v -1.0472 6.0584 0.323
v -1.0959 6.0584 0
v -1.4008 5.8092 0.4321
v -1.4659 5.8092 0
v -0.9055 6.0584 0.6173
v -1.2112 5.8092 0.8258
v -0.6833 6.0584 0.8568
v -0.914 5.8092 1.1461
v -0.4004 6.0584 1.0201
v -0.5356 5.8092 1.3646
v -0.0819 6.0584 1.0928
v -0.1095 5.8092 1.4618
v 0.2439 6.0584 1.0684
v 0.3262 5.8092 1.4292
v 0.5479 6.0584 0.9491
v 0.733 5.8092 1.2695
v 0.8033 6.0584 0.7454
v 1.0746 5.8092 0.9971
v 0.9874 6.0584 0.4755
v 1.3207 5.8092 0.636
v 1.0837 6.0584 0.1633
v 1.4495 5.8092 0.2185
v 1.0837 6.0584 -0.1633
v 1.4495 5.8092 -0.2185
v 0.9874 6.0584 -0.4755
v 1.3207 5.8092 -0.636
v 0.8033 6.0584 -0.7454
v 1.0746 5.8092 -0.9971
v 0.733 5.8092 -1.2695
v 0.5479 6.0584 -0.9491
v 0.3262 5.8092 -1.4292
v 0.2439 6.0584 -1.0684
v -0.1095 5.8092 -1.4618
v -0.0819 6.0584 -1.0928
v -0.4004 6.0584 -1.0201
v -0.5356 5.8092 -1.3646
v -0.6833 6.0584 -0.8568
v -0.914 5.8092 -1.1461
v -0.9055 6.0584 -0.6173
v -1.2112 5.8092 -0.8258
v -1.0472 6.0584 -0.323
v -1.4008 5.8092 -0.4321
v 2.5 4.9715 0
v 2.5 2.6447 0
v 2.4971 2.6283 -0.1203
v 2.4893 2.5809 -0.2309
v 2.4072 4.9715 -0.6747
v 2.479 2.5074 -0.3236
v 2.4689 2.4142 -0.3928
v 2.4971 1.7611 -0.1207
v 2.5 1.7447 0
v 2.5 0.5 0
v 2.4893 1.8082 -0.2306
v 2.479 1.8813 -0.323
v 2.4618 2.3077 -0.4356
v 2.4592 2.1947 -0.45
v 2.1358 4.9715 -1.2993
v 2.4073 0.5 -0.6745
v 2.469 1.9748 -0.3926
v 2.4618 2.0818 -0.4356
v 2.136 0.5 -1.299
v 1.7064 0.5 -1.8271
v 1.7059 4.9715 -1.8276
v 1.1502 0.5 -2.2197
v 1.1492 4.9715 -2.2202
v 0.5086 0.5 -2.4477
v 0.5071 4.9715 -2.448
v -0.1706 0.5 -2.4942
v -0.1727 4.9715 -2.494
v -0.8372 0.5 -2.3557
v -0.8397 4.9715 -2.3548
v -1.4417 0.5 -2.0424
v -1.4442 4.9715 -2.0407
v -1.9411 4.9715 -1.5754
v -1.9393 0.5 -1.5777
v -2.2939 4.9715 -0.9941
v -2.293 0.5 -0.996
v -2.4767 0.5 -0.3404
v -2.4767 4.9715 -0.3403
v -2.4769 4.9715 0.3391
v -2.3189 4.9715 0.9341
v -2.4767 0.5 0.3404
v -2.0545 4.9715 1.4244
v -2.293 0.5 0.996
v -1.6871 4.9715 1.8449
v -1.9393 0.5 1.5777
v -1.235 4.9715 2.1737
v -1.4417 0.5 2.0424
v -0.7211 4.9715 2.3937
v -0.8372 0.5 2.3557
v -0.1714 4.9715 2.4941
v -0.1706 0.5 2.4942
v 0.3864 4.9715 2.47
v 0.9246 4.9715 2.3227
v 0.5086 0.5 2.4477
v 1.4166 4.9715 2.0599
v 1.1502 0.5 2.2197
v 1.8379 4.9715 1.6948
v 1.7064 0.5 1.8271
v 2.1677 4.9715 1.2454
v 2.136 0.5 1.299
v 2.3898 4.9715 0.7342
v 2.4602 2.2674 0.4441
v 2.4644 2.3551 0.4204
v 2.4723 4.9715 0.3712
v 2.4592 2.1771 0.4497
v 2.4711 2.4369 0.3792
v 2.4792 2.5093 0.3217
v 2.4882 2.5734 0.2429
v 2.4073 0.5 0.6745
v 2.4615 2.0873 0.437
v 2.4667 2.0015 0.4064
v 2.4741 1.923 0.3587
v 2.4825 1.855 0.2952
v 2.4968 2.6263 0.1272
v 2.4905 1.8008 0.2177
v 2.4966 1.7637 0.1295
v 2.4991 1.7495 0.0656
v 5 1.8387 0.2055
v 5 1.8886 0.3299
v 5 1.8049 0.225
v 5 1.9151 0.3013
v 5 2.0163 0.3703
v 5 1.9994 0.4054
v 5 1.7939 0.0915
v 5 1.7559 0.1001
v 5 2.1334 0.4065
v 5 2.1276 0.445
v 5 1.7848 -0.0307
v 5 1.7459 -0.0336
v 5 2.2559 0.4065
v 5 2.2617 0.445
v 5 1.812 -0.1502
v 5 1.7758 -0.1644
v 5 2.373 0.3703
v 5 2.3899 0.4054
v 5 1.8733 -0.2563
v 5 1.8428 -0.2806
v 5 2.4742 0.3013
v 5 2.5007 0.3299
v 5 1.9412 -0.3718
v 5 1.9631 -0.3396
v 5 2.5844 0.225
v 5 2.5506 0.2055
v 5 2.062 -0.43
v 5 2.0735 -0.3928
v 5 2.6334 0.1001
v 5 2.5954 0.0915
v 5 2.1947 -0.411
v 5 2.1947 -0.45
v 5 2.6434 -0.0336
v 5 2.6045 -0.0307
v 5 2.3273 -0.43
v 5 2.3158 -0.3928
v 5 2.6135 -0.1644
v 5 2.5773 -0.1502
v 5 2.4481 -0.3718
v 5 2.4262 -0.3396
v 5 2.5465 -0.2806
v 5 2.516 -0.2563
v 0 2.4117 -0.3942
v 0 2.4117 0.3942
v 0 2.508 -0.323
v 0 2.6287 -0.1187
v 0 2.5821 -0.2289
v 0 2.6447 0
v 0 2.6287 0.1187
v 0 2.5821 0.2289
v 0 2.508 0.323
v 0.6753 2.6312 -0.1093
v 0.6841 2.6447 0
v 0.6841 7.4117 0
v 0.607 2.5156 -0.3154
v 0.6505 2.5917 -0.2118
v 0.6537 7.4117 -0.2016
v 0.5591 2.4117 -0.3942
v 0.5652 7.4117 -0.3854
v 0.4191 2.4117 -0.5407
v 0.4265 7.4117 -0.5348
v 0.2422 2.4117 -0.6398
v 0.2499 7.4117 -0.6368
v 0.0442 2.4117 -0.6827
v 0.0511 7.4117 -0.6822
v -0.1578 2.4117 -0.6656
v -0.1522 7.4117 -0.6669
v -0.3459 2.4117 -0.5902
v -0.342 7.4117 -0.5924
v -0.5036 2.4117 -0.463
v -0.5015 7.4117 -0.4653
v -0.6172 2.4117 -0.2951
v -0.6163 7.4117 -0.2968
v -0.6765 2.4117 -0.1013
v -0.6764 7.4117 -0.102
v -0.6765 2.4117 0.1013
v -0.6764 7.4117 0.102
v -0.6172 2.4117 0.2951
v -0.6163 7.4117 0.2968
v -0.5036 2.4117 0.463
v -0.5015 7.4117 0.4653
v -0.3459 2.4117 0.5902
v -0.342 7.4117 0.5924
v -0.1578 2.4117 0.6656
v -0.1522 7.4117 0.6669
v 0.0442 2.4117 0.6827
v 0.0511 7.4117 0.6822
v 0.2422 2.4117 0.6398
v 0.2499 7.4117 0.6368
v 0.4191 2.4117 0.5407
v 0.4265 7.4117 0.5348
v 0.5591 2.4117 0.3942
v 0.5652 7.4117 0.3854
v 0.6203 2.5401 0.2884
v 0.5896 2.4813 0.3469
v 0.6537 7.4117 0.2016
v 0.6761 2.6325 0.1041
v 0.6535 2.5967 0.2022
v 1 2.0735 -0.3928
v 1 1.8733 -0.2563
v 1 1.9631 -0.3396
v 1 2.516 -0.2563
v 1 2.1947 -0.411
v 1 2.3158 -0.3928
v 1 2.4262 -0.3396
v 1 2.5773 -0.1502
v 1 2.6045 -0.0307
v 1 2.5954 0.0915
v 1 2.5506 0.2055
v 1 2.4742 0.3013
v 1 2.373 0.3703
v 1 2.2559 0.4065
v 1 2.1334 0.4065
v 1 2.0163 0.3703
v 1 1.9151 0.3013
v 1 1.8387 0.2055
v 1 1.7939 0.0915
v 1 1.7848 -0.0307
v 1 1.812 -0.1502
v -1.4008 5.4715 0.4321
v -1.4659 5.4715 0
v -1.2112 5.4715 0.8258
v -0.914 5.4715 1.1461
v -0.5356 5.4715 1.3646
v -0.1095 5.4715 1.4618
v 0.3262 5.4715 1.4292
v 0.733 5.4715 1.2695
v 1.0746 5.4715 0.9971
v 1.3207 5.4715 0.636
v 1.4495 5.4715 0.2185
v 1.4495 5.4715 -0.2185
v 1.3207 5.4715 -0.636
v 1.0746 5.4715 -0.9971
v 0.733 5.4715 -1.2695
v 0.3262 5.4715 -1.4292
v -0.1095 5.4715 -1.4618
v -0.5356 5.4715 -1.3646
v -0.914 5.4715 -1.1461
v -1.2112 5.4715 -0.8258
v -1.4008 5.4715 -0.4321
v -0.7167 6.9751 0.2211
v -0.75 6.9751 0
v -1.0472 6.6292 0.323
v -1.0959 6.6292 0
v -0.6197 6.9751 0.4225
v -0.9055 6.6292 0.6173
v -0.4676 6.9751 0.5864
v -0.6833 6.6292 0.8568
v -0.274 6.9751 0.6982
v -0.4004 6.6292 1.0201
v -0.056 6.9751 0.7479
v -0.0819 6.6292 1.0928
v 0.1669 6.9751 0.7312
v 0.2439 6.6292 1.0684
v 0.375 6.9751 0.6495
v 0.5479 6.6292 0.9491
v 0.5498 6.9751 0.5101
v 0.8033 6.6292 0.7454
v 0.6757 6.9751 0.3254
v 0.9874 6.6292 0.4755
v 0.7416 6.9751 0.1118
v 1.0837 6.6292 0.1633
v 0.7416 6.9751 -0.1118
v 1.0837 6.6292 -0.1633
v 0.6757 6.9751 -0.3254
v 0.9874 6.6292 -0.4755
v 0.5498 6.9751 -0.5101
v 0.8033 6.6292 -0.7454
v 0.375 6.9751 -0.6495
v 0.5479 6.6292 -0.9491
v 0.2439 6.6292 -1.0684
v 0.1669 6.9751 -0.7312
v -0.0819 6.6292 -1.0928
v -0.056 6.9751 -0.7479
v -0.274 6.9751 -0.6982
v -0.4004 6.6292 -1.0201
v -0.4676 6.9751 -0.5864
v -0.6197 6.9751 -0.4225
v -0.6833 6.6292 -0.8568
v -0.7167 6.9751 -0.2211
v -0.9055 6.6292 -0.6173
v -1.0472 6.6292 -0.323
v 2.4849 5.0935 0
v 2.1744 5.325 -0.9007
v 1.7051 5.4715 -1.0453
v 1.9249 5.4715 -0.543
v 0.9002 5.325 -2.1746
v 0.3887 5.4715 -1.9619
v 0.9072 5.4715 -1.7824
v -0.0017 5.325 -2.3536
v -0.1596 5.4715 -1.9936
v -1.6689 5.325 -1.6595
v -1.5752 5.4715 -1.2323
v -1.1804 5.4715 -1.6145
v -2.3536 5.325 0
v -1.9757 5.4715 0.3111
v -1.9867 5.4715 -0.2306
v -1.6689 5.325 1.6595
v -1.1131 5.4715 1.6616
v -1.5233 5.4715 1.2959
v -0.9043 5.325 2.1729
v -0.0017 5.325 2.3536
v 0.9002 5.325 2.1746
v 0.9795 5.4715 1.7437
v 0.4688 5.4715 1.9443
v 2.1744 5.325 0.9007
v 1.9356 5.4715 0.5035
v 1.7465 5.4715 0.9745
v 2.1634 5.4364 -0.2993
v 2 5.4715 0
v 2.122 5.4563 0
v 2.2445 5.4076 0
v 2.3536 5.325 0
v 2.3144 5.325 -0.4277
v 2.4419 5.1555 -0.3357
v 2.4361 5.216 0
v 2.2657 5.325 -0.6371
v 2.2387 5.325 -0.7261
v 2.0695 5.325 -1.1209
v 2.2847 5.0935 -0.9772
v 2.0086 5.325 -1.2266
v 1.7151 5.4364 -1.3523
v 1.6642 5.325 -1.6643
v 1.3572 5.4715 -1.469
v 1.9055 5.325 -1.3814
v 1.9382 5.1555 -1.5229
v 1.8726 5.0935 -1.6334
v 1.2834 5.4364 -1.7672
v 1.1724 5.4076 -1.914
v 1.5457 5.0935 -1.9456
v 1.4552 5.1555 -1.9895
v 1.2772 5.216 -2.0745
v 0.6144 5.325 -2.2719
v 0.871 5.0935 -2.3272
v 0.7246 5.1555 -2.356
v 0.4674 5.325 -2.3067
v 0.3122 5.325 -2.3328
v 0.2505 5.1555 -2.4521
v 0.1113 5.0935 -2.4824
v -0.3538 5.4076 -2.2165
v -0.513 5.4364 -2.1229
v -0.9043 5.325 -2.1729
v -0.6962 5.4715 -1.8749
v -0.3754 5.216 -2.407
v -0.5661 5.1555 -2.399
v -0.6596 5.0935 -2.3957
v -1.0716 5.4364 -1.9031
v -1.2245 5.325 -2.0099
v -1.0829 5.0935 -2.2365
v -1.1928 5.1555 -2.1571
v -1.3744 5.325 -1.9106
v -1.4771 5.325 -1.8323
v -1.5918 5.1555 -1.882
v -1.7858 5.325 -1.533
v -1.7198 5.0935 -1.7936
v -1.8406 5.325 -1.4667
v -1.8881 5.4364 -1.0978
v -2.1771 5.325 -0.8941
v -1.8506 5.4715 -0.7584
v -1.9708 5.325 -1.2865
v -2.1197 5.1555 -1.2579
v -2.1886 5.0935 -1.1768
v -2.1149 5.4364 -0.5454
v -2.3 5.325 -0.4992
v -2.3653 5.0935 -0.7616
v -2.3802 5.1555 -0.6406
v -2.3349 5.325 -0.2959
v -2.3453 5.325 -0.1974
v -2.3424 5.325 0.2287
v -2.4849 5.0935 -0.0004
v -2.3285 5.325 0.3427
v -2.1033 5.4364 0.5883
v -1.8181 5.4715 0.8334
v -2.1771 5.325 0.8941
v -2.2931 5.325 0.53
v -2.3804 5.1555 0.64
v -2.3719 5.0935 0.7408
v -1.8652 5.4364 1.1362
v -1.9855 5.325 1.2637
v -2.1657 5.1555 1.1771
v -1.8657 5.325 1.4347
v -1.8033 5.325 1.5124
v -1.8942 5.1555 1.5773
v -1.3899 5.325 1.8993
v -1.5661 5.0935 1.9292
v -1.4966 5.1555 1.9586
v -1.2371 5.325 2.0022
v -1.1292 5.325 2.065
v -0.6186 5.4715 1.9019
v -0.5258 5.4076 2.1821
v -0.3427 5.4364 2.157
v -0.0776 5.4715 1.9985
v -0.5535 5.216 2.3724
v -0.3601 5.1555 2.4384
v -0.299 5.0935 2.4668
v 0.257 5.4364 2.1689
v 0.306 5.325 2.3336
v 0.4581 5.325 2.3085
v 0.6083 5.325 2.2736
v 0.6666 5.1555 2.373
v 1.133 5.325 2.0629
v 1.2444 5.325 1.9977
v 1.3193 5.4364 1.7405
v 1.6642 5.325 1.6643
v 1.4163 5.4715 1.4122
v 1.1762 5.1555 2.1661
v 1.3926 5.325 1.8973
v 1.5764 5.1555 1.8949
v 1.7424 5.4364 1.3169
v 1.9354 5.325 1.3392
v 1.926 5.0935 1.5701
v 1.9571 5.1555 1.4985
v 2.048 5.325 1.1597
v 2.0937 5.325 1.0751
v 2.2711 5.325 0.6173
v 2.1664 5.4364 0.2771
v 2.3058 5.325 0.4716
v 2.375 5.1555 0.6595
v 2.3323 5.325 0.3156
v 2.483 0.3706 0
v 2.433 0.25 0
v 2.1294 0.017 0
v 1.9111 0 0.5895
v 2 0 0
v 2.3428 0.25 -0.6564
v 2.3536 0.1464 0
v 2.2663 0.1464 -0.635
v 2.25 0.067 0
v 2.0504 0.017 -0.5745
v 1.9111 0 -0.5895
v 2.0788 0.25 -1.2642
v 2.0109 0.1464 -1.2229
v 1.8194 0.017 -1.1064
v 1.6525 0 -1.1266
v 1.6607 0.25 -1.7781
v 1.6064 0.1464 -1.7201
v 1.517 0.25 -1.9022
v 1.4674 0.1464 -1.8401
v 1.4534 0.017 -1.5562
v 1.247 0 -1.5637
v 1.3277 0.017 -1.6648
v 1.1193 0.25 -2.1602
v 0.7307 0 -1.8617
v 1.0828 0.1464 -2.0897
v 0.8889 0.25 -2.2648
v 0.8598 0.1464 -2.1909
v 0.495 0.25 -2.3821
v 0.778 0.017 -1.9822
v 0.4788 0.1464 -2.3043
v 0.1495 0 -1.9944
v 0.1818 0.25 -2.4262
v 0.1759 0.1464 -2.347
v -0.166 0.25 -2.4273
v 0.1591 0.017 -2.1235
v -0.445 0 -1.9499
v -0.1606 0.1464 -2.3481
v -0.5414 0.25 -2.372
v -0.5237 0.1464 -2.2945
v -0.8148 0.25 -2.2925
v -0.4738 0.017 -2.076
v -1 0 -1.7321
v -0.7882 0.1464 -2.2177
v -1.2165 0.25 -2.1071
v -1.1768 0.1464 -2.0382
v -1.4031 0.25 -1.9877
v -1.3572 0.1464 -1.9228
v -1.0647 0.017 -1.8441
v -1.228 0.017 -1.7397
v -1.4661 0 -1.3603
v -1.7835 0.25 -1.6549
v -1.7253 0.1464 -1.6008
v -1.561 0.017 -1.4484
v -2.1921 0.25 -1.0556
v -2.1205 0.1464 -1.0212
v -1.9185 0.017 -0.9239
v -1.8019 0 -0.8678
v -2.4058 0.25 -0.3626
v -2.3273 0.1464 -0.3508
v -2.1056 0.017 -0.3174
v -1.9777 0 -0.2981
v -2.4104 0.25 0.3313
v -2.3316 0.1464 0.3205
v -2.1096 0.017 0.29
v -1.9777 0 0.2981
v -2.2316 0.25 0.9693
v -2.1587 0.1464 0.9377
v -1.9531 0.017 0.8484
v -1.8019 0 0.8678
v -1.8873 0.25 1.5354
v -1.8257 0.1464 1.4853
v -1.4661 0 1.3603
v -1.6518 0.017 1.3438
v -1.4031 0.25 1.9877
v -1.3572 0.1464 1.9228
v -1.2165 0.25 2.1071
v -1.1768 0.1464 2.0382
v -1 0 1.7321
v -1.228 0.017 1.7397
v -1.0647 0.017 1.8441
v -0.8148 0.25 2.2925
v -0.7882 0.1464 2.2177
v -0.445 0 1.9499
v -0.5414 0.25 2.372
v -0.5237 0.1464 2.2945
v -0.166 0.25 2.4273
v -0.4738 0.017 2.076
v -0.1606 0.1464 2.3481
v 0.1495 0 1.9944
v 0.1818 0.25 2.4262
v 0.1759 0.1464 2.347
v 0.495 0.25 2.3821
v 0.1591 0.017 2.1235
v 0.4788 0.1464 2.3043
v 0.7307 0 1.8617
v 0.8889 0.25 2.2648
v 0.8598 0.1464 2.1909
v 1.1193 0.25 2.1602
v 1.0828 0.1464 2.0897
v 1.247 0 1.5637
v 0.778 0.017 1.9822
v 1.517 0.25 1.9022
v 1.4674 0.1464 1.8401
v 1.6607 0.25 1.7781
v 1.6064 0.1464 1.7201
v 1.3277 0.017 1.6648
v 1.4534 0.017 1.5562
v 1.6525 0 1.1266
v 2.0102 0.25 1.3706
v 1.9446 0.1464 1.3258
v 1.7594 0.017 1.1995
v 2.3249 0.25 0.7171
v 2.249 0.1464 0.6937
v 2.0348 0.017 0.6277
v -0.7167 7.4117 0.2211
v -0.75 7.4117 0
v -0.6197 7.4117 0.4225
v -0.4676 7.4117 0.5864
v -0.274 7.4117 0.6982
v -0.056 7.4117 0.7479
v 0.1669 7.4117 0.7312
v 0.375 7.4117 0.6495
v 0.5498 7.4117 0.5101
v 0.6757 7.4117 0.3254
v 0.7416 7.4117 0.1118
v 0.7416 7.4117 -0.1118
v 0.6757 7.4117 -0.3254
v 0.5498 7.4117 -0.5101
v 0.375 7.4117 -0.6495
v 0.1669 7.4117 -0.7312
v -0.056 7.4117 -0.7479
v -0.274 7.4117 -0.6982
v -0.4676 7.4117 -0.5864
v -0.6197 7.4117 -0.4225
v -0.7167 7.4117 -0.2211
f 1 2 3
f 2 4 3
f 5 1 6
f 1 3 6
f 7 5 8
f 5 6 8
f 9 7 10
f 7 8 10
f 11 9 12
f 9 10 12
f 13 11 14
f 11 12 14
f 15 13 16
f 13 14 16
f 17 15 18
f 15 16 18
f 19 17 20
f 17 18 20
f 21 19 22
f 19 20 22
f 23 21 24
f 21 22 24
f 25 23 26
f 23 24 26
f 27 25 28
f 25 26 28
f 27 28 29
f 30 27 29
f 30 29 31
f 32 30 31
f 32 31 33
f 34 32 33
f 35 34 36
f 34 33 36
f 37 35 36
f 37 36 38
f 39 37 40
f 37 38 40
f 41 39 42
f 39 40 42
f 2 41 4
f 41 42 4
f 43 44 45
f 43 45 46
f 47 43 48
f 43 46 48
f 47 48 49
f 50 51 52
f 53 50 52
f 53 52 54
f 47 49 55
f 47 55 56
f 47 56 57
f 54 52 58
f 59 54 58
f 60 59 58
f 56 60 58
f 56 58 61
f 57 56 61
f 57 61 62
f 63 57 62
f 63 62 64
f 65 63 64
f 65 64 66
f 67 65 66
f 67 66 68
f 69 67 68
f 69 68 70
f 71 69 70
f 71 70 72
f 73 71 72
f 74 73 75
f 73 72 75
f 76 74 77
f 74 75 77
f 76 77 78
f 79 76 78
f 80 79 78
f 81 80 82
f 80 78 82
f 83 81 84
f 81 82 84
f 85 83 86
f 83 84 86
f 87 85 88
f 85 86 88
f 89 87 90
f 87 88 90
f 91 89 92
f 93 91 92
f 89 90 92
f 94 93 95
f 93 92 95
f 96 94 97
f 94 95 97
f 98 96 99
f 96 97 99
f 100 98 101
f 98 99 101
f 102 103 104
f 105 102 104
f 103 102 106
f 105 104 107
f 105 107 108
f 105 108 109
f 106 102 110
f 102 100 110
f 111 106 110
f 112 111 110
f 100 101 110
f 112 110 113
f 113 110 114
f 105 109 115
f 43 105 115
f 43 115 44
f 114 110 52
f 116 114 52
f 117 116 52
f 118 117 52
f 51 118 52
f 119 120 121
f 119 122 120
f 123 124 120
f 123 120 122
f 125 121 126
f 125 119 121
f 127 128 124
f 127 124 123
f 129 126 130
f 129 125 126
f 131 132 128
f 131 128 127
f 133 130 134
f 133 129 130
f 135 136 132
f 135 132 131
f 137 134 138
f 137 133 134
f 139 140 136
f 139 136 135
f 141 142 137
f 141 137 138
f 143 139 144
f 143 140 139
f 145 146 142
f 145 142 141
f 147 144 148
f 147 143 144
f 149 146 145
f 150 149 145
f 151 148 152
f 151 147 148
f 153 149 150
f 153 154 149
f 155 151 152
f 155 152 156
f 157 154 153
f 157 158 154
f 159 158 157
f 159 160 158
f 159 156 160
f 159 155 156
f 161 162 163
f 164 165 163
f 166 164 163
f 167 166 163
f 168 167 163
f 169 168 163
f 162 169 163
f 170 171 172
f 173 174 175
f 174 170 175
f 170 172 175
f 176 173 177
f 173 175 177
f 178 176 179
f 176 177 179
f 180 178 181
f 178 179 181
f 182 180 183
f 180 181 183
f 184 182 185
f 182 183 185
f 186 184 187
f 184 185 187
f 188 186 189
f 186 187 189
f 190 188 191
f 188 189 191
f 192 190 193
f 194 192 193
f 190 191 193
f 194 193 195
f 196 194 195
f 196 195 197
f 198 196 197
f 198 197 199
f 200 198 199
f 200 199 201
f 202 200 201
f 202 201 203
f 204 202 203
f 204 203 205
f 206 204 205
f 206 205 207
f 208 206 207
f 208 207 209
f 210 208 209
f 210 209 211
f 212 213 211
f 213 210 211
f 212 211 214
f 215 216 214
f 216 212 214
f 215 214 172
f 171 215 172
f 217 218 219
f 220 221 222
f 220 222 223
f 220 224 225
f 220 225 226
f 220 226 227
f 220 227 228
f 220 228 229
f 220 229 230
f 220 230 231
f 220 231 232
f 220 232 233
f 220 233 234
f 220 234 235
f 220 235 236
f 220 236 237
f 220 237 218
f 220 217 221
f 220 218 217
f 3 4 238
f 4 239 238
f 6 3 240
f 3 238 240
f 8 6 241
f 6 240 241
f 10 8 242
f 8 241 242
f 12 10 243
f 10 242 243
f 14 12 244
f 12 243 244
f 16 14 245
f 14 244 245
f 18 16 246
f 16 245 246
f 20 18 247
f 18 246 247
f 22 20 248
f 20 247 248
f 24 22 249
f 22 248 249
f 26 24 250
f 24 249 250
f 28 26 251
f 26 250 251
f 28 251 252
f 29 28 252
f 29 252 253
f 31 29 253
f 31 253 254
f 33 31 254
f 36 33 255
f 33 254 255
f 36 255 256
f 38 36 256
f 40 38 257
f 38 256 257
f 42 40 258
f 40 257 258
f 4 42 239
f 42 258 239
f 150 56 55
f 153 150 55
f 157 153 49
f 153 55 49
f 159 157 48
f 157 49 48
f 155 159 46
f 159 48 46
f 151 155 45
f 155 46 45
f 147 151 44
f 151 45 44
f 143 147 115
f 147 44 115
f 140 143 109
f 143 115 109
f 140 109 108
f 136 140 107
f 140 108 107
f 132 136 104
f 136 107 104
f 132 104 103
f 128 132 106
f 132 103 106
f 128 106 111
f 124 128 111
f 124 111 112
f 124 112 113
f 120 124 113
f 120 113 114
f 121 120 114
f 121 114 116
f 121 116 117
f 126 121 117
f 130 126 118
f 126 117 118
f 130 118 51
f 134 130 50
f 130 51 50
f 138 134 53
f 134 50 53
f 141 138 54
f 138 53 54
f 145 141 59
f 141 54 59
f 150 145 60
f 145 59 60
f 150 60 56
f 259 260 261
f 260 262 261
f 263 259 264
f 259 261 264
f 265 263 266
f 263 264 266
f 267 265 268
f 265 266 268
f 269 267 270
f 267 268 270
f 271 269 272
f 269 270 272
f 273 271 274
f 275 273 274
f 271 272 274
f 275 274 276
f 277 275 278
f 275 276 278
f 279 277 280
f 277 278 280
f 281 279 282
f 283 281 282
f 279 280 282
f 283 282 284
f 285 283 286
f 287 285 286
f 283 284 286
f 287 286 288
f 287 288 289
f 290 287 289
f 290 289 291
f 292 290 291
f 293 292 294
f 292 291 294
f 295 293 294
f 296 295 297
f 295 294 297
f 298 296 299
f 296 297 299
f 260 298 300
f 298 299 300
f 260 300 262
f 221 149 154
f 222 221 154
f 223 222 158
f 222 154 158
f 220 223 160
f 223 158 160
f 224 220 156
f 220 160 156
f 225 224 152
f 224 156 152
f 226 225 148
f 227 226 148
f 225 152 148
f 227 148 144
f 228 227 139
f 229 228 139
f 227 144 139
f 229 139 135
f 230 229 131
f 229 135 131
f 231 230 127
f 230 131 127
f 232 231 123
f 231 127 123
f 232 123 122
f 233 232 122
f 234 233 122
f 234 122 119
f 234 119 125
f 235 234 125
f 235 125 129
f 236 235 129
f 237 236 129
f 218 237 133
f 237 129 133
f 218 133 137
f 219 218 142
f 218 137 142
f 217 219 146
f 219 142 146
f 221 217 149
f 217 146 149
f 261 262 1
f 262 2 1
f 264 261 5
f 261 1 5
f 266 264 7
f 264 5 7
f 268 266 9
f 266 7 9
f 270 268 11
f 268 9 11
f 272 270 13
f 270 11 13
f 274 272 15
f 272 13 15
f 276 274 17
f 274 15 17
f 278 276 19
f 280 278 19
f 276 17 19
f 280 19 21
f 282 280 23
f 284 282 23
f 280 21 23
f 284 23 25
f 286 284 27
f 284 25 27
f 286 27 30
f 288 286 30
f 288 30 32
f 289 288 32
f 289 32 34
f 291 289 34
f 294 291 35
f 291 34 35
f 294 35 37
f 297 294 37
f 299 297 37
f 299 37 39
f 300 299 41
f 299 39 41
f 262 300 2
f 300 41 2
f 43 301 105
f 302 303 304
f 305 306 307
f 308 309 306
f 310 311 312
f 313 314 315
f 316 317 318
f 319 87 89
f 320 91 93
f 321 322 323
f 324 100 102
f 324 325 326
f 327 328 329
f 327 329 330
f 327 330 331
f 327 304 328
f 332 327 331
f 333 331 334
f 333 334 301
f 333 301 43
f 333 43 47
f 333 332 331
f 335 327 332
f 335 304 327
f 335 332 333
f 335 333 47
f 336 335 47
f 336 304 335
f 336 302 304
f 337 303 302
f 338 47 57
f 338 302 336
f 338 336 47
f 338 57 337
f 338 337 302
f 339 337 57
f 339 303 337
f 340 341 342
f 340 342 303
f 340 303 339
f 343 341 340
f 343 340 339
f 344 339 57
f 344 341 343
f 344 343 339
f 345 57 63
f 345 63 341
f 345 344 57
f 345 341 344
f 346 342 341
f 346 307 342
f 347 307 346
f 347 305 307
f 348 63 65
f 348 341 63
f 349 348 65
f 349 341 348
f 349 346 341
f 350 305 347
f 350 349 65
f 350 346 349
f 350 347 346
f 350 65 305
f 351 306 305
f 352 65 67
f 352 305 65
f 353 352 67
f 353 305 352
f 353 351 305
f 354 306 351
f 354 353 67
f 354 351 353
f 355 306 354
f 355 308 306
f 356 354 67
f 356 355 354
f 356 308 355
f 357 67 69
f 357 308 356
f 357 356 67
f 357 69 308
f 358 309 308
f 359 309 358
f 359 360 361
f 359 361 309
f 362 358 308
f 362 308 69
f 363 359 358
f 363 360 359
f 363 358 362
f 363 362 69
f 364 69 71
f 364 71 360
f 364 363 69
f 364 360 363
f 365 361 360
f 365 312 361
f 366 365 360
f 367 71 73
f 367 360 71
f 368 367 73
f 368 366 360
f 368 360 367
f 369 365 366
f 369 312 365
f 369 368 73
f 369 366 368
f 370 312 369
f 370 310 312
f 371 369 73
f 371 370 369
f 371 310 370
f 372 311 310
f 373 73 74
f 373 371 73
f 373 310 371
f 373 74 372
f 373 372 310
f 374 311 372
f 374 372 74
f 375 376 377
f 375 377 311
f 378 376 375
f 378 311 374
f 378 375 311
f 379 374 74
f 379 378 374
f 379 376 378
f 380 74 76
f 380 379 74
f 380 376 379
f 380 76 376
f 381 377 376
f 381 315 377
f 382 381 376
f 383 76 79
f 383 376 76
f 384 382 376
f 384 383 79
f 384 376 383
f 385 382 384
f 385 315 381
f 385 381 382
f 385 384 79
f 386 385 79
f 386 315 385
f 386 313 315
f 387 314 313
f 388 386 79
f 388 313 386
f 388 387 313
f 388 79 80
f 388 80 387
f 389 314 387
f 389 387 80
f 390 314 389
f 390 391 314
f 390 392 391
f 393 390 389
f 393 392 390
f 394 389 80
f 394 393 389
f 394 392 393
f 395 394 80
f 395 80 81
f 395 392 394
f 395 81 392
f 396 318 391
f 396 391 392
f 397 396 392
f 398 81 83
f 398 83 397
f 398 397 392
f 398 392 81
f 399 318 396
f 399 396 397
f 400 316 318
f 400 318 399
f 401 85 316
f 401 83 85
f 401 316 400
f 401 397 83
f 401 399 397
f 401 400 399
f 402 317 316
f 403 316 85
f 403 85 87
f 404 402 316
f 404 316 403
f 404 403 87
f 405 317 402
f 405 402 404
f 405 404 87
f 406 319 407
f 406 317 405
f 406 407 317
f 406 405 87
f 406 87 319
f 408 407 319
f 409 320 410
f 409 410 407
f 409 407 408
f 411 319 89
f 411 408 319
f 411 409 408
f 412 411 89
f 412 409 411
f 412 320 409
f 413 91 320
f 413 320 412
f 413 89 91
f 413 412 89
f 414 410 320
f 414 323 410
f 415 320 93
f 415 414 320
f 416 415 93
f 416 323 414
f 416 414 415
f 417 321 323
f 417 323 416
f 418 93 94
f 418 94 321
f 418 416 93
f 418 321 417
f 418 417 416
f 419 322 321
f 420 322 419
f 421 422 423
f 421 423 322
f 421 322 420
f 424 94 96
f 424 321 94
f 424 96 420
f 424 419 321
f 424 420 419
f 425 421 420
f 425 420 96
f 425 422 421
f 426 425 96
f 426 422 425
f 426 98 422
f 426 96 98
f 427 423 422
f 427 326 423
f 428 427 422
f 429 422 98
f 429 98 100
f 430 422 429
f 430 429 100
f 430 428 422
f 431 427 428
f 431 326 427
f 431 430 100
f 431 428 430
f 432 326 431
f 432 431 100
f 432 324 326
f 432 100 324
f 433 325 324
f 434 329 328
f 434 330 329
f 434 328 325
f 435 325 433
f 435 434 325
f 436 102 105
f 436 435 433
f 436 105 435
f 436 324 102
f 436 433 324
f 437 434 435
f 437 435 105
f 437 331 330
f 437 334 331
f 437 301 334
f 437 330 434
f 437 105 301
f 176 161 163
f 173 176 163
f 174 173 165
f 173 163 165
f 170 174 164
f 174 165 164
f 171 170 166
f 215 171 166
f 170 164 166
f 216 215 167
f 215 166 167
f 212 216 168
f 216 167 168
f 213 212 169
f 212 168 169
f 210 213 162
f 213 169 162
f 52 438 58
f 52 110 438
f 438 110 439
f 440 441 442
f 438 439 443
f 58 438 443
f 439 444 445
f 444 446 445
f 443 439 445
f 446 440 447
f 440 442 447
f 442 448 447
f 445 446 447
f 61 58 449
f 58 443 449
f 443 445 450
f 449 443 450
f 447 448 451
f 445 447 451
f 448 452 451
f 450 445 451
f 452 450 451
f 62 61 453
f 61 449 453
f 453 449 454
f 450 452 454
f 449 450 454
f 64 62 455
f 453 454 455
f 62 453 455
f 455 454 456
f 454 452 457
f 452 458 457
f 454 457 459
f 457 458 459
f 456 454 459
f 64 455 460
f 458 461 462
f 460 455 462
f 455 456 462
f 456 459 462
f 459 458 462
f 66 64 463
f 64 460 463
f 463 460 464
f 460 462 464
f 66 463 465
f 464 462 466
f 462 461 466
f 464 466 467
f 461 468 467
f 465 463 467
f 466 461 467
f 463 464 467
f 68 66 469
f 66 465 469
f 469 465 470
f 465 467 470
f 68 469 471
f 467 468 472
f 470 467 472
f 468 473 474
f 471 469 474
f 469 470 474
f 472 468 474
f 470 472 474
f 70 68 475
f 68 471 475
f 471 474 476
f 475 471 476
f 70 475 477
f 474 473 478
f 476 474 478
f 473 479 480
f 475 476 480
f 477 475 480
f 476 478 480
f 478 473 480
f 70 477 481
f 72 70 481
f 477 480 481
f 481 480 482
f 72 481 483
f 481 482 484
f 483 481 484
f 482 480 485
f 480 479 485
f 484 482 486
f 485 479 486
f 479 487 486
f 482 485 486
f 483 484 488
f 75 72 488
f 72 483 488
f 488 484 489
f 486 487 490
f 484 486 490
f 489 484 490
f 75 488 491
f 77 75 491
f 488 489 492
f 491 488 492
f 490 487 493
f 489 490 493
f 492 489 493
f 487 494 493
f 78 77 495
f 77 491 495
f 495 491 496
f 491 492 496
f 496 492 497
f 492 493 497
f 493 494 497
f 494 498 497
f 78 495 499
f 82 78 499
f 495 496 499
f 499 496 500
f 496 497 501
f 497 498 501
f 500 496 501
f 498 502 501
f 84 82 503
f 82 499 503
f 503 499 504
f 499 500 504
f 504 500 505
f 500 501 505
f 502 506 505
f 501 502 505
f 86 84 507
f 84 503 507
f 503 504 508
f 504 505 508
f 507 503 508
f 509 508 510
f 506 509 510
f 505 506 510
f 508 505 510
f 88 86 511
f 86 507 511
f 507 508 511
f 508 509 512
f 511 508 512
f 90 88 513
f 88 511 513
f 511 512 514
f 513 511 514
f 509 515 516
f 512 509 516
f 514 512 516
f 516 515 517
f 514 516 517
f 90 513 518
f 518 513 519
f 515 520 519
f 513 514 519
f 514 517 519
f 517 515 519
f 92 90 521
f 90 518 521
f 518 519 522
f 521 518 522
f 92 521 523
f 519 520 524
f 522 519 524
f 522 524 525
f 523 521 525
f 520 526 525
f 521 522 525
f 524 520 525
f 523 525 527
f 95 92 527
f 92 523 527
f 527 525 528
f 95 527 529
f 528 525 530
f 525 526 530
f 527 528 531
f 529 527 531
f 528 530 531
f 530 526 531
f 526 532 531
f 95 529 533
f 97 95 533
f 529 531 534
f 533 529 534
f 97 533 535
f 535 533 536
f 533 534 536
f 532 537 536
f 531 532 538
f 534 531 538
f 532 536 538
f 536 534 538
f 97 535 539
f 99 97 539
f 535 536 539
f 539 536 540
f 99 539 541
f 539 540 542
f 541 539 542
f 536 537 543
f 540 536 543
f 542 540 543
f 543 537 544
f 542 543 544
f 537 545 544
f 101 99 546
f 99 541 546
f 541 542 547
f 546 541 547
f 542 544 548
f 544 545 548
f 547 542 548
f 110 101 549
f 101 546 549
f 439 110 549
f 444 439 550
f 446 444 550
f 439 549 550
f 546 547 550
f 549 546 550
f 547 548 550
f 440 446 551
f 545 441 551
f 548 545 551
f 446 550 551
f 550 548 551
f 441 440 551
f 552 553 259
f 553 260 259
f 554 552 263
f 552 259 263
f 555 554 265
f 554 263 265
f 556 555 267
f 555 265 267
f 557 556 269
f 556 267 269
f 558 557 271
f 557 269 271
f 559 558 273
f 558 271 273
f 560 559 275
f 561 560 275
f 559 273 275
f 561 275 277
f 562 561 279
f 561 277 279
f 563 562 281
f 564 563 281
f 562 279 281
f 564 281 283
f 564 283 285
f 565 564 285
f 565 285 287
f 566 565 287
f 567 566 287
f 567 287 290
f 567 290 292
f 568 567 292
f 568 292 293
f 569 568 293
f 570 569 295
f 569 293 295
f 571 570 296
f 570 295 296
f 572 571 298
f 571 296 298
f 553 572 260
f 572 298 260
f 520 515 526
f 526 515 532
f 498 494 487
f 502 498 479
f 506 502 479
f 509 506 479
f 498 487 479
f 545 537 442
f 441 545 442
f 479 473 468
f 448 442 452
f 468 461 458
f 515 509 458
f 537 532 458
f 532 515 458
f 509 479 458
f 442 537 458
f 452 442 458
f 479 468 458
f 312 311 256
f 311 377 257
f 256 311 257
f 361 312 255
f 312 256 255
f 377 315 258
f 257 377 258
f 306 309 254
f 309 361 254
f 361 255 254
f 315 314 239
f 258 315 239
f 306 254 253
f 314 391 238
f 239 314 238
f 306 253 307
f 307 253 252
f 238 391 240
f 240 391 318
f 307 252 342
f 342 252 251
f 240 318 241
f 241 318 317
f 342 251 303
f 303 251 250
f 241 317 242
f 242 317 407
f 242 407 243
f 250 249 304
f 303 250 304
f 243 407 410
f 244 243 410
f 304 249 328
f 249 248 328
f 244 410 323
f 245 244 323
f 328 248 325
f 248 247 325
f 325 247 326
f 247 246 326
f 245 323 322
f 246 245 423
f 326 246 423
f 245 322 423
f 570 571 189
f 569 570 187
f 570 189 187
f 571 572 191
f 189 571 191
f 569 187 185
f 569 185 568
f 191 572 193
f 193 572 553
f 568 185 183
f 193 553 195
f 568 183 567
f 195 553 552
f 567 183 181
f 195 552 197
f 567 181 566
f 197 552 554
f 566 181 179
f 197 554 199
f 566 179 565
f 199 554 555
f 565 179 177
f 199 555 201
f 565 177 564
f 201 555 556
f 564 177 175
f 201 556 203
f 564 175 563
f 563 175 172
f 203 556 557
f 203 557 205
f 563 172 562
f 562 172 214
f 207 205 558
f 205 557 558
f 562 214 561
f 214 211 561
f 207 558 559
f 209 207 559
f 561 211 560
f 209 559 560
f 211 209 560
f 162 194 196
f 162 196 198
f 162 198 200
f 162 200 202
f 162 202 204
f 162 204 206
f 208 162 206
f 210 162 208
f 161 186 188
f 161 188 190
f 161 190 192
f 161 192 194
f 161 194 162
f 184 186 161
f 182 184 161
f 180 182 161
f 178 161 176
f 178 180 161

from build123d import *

# Parameters (mm, degrees)
SKETCH2_R           = 2.5
BOSS_EXTRUDE1_DEPTH = 5
SKETCH4_R           = 0.684081367
CUT_EXTRUDE1_DEPTH  = 5
FILLET2_R           = 0.5
SKETCH5_R           = 0.45
BOSS_EXTRUDE2_DEPTH = 5
SKETCH6_R           = 0.411041126
CUT_EXTRUDE2_DEPTH  = 4


with BuildPart() as part:
    # Sketch2 → Boss-Extrude1 (new body)
    with BuildSketch(Plane(origin=(0, 0, 0), x_dir=(1, 0, 0), z_dir=(0, 1, 0))):
        Circle(SKETCH2_R)
    extrude(amount=BOSS_EXTRUDE1_DEPTH)

    # Sketch3 → Revolve2 (revolve)
    with BuildSketch(Plane.XY):
        Polygon((0, 7.411705002), (-0.75, 7.411705002), (-0.75, 6.975061564), (-1.095892568, 6.629168996), (-1.095892568, 6.058427362), (-1.465907088, 5.809167185), (-1.465907088, 5.471459847), (-2.5, 5.471459847), (-2.5, 5), (0, 5), align=None)
    revolve(axis=Axis((0, 0, 0), (0, 1, 0)))

    # Sketch4 → Cut-Extrude1 (cut)
    with BuildSketch(Plane(origin=(0, 7.411705002, 0), x_dir=(1, 0, 0), z_dir=(0, 1, 0))):
        Circle(SKETCH4_R)
    extrude(amount=-CUT_EXTRUDE1_DEPTH, mode=Mode.SUBTRACT)

    # Fillet2
    fillet2_edges = [part.edges().sort_by_distance(p)[0] for p in [
        (-2.5, 0, 0),
        (2.5, 5.471459847, 0),
    ]]
    fillet(fillet2_edges, radius=FILLET2_R)

    # Sketch5 → Boss-Extrude2 (add)
    with BuildSketch(Plane(origin=(0, 0, 0), x_dir=(0, 0, -1), z_dir=(1, 0, 0))):
        with Locations((0, 2.194655863)):
            Circle(SKETCH5_R)
    extrude(amount=BOSS_EXTRUDE2_DEPTH)

    # Sketch6 → Cut-Extrude2 (cut)
    with BuildSketch(Plane(origin=(5, 0, 0), x_dir=(0, 0, -1), z_dir=(1, 0, 0))):
        with Locations((0, 2.194655863)):
            Circle(SKETCH6_R)
    extrude(amount=-CUT_EXTRUDE2_DEPTH, mode=Mode.SUBTRACT)


solid = part.part
